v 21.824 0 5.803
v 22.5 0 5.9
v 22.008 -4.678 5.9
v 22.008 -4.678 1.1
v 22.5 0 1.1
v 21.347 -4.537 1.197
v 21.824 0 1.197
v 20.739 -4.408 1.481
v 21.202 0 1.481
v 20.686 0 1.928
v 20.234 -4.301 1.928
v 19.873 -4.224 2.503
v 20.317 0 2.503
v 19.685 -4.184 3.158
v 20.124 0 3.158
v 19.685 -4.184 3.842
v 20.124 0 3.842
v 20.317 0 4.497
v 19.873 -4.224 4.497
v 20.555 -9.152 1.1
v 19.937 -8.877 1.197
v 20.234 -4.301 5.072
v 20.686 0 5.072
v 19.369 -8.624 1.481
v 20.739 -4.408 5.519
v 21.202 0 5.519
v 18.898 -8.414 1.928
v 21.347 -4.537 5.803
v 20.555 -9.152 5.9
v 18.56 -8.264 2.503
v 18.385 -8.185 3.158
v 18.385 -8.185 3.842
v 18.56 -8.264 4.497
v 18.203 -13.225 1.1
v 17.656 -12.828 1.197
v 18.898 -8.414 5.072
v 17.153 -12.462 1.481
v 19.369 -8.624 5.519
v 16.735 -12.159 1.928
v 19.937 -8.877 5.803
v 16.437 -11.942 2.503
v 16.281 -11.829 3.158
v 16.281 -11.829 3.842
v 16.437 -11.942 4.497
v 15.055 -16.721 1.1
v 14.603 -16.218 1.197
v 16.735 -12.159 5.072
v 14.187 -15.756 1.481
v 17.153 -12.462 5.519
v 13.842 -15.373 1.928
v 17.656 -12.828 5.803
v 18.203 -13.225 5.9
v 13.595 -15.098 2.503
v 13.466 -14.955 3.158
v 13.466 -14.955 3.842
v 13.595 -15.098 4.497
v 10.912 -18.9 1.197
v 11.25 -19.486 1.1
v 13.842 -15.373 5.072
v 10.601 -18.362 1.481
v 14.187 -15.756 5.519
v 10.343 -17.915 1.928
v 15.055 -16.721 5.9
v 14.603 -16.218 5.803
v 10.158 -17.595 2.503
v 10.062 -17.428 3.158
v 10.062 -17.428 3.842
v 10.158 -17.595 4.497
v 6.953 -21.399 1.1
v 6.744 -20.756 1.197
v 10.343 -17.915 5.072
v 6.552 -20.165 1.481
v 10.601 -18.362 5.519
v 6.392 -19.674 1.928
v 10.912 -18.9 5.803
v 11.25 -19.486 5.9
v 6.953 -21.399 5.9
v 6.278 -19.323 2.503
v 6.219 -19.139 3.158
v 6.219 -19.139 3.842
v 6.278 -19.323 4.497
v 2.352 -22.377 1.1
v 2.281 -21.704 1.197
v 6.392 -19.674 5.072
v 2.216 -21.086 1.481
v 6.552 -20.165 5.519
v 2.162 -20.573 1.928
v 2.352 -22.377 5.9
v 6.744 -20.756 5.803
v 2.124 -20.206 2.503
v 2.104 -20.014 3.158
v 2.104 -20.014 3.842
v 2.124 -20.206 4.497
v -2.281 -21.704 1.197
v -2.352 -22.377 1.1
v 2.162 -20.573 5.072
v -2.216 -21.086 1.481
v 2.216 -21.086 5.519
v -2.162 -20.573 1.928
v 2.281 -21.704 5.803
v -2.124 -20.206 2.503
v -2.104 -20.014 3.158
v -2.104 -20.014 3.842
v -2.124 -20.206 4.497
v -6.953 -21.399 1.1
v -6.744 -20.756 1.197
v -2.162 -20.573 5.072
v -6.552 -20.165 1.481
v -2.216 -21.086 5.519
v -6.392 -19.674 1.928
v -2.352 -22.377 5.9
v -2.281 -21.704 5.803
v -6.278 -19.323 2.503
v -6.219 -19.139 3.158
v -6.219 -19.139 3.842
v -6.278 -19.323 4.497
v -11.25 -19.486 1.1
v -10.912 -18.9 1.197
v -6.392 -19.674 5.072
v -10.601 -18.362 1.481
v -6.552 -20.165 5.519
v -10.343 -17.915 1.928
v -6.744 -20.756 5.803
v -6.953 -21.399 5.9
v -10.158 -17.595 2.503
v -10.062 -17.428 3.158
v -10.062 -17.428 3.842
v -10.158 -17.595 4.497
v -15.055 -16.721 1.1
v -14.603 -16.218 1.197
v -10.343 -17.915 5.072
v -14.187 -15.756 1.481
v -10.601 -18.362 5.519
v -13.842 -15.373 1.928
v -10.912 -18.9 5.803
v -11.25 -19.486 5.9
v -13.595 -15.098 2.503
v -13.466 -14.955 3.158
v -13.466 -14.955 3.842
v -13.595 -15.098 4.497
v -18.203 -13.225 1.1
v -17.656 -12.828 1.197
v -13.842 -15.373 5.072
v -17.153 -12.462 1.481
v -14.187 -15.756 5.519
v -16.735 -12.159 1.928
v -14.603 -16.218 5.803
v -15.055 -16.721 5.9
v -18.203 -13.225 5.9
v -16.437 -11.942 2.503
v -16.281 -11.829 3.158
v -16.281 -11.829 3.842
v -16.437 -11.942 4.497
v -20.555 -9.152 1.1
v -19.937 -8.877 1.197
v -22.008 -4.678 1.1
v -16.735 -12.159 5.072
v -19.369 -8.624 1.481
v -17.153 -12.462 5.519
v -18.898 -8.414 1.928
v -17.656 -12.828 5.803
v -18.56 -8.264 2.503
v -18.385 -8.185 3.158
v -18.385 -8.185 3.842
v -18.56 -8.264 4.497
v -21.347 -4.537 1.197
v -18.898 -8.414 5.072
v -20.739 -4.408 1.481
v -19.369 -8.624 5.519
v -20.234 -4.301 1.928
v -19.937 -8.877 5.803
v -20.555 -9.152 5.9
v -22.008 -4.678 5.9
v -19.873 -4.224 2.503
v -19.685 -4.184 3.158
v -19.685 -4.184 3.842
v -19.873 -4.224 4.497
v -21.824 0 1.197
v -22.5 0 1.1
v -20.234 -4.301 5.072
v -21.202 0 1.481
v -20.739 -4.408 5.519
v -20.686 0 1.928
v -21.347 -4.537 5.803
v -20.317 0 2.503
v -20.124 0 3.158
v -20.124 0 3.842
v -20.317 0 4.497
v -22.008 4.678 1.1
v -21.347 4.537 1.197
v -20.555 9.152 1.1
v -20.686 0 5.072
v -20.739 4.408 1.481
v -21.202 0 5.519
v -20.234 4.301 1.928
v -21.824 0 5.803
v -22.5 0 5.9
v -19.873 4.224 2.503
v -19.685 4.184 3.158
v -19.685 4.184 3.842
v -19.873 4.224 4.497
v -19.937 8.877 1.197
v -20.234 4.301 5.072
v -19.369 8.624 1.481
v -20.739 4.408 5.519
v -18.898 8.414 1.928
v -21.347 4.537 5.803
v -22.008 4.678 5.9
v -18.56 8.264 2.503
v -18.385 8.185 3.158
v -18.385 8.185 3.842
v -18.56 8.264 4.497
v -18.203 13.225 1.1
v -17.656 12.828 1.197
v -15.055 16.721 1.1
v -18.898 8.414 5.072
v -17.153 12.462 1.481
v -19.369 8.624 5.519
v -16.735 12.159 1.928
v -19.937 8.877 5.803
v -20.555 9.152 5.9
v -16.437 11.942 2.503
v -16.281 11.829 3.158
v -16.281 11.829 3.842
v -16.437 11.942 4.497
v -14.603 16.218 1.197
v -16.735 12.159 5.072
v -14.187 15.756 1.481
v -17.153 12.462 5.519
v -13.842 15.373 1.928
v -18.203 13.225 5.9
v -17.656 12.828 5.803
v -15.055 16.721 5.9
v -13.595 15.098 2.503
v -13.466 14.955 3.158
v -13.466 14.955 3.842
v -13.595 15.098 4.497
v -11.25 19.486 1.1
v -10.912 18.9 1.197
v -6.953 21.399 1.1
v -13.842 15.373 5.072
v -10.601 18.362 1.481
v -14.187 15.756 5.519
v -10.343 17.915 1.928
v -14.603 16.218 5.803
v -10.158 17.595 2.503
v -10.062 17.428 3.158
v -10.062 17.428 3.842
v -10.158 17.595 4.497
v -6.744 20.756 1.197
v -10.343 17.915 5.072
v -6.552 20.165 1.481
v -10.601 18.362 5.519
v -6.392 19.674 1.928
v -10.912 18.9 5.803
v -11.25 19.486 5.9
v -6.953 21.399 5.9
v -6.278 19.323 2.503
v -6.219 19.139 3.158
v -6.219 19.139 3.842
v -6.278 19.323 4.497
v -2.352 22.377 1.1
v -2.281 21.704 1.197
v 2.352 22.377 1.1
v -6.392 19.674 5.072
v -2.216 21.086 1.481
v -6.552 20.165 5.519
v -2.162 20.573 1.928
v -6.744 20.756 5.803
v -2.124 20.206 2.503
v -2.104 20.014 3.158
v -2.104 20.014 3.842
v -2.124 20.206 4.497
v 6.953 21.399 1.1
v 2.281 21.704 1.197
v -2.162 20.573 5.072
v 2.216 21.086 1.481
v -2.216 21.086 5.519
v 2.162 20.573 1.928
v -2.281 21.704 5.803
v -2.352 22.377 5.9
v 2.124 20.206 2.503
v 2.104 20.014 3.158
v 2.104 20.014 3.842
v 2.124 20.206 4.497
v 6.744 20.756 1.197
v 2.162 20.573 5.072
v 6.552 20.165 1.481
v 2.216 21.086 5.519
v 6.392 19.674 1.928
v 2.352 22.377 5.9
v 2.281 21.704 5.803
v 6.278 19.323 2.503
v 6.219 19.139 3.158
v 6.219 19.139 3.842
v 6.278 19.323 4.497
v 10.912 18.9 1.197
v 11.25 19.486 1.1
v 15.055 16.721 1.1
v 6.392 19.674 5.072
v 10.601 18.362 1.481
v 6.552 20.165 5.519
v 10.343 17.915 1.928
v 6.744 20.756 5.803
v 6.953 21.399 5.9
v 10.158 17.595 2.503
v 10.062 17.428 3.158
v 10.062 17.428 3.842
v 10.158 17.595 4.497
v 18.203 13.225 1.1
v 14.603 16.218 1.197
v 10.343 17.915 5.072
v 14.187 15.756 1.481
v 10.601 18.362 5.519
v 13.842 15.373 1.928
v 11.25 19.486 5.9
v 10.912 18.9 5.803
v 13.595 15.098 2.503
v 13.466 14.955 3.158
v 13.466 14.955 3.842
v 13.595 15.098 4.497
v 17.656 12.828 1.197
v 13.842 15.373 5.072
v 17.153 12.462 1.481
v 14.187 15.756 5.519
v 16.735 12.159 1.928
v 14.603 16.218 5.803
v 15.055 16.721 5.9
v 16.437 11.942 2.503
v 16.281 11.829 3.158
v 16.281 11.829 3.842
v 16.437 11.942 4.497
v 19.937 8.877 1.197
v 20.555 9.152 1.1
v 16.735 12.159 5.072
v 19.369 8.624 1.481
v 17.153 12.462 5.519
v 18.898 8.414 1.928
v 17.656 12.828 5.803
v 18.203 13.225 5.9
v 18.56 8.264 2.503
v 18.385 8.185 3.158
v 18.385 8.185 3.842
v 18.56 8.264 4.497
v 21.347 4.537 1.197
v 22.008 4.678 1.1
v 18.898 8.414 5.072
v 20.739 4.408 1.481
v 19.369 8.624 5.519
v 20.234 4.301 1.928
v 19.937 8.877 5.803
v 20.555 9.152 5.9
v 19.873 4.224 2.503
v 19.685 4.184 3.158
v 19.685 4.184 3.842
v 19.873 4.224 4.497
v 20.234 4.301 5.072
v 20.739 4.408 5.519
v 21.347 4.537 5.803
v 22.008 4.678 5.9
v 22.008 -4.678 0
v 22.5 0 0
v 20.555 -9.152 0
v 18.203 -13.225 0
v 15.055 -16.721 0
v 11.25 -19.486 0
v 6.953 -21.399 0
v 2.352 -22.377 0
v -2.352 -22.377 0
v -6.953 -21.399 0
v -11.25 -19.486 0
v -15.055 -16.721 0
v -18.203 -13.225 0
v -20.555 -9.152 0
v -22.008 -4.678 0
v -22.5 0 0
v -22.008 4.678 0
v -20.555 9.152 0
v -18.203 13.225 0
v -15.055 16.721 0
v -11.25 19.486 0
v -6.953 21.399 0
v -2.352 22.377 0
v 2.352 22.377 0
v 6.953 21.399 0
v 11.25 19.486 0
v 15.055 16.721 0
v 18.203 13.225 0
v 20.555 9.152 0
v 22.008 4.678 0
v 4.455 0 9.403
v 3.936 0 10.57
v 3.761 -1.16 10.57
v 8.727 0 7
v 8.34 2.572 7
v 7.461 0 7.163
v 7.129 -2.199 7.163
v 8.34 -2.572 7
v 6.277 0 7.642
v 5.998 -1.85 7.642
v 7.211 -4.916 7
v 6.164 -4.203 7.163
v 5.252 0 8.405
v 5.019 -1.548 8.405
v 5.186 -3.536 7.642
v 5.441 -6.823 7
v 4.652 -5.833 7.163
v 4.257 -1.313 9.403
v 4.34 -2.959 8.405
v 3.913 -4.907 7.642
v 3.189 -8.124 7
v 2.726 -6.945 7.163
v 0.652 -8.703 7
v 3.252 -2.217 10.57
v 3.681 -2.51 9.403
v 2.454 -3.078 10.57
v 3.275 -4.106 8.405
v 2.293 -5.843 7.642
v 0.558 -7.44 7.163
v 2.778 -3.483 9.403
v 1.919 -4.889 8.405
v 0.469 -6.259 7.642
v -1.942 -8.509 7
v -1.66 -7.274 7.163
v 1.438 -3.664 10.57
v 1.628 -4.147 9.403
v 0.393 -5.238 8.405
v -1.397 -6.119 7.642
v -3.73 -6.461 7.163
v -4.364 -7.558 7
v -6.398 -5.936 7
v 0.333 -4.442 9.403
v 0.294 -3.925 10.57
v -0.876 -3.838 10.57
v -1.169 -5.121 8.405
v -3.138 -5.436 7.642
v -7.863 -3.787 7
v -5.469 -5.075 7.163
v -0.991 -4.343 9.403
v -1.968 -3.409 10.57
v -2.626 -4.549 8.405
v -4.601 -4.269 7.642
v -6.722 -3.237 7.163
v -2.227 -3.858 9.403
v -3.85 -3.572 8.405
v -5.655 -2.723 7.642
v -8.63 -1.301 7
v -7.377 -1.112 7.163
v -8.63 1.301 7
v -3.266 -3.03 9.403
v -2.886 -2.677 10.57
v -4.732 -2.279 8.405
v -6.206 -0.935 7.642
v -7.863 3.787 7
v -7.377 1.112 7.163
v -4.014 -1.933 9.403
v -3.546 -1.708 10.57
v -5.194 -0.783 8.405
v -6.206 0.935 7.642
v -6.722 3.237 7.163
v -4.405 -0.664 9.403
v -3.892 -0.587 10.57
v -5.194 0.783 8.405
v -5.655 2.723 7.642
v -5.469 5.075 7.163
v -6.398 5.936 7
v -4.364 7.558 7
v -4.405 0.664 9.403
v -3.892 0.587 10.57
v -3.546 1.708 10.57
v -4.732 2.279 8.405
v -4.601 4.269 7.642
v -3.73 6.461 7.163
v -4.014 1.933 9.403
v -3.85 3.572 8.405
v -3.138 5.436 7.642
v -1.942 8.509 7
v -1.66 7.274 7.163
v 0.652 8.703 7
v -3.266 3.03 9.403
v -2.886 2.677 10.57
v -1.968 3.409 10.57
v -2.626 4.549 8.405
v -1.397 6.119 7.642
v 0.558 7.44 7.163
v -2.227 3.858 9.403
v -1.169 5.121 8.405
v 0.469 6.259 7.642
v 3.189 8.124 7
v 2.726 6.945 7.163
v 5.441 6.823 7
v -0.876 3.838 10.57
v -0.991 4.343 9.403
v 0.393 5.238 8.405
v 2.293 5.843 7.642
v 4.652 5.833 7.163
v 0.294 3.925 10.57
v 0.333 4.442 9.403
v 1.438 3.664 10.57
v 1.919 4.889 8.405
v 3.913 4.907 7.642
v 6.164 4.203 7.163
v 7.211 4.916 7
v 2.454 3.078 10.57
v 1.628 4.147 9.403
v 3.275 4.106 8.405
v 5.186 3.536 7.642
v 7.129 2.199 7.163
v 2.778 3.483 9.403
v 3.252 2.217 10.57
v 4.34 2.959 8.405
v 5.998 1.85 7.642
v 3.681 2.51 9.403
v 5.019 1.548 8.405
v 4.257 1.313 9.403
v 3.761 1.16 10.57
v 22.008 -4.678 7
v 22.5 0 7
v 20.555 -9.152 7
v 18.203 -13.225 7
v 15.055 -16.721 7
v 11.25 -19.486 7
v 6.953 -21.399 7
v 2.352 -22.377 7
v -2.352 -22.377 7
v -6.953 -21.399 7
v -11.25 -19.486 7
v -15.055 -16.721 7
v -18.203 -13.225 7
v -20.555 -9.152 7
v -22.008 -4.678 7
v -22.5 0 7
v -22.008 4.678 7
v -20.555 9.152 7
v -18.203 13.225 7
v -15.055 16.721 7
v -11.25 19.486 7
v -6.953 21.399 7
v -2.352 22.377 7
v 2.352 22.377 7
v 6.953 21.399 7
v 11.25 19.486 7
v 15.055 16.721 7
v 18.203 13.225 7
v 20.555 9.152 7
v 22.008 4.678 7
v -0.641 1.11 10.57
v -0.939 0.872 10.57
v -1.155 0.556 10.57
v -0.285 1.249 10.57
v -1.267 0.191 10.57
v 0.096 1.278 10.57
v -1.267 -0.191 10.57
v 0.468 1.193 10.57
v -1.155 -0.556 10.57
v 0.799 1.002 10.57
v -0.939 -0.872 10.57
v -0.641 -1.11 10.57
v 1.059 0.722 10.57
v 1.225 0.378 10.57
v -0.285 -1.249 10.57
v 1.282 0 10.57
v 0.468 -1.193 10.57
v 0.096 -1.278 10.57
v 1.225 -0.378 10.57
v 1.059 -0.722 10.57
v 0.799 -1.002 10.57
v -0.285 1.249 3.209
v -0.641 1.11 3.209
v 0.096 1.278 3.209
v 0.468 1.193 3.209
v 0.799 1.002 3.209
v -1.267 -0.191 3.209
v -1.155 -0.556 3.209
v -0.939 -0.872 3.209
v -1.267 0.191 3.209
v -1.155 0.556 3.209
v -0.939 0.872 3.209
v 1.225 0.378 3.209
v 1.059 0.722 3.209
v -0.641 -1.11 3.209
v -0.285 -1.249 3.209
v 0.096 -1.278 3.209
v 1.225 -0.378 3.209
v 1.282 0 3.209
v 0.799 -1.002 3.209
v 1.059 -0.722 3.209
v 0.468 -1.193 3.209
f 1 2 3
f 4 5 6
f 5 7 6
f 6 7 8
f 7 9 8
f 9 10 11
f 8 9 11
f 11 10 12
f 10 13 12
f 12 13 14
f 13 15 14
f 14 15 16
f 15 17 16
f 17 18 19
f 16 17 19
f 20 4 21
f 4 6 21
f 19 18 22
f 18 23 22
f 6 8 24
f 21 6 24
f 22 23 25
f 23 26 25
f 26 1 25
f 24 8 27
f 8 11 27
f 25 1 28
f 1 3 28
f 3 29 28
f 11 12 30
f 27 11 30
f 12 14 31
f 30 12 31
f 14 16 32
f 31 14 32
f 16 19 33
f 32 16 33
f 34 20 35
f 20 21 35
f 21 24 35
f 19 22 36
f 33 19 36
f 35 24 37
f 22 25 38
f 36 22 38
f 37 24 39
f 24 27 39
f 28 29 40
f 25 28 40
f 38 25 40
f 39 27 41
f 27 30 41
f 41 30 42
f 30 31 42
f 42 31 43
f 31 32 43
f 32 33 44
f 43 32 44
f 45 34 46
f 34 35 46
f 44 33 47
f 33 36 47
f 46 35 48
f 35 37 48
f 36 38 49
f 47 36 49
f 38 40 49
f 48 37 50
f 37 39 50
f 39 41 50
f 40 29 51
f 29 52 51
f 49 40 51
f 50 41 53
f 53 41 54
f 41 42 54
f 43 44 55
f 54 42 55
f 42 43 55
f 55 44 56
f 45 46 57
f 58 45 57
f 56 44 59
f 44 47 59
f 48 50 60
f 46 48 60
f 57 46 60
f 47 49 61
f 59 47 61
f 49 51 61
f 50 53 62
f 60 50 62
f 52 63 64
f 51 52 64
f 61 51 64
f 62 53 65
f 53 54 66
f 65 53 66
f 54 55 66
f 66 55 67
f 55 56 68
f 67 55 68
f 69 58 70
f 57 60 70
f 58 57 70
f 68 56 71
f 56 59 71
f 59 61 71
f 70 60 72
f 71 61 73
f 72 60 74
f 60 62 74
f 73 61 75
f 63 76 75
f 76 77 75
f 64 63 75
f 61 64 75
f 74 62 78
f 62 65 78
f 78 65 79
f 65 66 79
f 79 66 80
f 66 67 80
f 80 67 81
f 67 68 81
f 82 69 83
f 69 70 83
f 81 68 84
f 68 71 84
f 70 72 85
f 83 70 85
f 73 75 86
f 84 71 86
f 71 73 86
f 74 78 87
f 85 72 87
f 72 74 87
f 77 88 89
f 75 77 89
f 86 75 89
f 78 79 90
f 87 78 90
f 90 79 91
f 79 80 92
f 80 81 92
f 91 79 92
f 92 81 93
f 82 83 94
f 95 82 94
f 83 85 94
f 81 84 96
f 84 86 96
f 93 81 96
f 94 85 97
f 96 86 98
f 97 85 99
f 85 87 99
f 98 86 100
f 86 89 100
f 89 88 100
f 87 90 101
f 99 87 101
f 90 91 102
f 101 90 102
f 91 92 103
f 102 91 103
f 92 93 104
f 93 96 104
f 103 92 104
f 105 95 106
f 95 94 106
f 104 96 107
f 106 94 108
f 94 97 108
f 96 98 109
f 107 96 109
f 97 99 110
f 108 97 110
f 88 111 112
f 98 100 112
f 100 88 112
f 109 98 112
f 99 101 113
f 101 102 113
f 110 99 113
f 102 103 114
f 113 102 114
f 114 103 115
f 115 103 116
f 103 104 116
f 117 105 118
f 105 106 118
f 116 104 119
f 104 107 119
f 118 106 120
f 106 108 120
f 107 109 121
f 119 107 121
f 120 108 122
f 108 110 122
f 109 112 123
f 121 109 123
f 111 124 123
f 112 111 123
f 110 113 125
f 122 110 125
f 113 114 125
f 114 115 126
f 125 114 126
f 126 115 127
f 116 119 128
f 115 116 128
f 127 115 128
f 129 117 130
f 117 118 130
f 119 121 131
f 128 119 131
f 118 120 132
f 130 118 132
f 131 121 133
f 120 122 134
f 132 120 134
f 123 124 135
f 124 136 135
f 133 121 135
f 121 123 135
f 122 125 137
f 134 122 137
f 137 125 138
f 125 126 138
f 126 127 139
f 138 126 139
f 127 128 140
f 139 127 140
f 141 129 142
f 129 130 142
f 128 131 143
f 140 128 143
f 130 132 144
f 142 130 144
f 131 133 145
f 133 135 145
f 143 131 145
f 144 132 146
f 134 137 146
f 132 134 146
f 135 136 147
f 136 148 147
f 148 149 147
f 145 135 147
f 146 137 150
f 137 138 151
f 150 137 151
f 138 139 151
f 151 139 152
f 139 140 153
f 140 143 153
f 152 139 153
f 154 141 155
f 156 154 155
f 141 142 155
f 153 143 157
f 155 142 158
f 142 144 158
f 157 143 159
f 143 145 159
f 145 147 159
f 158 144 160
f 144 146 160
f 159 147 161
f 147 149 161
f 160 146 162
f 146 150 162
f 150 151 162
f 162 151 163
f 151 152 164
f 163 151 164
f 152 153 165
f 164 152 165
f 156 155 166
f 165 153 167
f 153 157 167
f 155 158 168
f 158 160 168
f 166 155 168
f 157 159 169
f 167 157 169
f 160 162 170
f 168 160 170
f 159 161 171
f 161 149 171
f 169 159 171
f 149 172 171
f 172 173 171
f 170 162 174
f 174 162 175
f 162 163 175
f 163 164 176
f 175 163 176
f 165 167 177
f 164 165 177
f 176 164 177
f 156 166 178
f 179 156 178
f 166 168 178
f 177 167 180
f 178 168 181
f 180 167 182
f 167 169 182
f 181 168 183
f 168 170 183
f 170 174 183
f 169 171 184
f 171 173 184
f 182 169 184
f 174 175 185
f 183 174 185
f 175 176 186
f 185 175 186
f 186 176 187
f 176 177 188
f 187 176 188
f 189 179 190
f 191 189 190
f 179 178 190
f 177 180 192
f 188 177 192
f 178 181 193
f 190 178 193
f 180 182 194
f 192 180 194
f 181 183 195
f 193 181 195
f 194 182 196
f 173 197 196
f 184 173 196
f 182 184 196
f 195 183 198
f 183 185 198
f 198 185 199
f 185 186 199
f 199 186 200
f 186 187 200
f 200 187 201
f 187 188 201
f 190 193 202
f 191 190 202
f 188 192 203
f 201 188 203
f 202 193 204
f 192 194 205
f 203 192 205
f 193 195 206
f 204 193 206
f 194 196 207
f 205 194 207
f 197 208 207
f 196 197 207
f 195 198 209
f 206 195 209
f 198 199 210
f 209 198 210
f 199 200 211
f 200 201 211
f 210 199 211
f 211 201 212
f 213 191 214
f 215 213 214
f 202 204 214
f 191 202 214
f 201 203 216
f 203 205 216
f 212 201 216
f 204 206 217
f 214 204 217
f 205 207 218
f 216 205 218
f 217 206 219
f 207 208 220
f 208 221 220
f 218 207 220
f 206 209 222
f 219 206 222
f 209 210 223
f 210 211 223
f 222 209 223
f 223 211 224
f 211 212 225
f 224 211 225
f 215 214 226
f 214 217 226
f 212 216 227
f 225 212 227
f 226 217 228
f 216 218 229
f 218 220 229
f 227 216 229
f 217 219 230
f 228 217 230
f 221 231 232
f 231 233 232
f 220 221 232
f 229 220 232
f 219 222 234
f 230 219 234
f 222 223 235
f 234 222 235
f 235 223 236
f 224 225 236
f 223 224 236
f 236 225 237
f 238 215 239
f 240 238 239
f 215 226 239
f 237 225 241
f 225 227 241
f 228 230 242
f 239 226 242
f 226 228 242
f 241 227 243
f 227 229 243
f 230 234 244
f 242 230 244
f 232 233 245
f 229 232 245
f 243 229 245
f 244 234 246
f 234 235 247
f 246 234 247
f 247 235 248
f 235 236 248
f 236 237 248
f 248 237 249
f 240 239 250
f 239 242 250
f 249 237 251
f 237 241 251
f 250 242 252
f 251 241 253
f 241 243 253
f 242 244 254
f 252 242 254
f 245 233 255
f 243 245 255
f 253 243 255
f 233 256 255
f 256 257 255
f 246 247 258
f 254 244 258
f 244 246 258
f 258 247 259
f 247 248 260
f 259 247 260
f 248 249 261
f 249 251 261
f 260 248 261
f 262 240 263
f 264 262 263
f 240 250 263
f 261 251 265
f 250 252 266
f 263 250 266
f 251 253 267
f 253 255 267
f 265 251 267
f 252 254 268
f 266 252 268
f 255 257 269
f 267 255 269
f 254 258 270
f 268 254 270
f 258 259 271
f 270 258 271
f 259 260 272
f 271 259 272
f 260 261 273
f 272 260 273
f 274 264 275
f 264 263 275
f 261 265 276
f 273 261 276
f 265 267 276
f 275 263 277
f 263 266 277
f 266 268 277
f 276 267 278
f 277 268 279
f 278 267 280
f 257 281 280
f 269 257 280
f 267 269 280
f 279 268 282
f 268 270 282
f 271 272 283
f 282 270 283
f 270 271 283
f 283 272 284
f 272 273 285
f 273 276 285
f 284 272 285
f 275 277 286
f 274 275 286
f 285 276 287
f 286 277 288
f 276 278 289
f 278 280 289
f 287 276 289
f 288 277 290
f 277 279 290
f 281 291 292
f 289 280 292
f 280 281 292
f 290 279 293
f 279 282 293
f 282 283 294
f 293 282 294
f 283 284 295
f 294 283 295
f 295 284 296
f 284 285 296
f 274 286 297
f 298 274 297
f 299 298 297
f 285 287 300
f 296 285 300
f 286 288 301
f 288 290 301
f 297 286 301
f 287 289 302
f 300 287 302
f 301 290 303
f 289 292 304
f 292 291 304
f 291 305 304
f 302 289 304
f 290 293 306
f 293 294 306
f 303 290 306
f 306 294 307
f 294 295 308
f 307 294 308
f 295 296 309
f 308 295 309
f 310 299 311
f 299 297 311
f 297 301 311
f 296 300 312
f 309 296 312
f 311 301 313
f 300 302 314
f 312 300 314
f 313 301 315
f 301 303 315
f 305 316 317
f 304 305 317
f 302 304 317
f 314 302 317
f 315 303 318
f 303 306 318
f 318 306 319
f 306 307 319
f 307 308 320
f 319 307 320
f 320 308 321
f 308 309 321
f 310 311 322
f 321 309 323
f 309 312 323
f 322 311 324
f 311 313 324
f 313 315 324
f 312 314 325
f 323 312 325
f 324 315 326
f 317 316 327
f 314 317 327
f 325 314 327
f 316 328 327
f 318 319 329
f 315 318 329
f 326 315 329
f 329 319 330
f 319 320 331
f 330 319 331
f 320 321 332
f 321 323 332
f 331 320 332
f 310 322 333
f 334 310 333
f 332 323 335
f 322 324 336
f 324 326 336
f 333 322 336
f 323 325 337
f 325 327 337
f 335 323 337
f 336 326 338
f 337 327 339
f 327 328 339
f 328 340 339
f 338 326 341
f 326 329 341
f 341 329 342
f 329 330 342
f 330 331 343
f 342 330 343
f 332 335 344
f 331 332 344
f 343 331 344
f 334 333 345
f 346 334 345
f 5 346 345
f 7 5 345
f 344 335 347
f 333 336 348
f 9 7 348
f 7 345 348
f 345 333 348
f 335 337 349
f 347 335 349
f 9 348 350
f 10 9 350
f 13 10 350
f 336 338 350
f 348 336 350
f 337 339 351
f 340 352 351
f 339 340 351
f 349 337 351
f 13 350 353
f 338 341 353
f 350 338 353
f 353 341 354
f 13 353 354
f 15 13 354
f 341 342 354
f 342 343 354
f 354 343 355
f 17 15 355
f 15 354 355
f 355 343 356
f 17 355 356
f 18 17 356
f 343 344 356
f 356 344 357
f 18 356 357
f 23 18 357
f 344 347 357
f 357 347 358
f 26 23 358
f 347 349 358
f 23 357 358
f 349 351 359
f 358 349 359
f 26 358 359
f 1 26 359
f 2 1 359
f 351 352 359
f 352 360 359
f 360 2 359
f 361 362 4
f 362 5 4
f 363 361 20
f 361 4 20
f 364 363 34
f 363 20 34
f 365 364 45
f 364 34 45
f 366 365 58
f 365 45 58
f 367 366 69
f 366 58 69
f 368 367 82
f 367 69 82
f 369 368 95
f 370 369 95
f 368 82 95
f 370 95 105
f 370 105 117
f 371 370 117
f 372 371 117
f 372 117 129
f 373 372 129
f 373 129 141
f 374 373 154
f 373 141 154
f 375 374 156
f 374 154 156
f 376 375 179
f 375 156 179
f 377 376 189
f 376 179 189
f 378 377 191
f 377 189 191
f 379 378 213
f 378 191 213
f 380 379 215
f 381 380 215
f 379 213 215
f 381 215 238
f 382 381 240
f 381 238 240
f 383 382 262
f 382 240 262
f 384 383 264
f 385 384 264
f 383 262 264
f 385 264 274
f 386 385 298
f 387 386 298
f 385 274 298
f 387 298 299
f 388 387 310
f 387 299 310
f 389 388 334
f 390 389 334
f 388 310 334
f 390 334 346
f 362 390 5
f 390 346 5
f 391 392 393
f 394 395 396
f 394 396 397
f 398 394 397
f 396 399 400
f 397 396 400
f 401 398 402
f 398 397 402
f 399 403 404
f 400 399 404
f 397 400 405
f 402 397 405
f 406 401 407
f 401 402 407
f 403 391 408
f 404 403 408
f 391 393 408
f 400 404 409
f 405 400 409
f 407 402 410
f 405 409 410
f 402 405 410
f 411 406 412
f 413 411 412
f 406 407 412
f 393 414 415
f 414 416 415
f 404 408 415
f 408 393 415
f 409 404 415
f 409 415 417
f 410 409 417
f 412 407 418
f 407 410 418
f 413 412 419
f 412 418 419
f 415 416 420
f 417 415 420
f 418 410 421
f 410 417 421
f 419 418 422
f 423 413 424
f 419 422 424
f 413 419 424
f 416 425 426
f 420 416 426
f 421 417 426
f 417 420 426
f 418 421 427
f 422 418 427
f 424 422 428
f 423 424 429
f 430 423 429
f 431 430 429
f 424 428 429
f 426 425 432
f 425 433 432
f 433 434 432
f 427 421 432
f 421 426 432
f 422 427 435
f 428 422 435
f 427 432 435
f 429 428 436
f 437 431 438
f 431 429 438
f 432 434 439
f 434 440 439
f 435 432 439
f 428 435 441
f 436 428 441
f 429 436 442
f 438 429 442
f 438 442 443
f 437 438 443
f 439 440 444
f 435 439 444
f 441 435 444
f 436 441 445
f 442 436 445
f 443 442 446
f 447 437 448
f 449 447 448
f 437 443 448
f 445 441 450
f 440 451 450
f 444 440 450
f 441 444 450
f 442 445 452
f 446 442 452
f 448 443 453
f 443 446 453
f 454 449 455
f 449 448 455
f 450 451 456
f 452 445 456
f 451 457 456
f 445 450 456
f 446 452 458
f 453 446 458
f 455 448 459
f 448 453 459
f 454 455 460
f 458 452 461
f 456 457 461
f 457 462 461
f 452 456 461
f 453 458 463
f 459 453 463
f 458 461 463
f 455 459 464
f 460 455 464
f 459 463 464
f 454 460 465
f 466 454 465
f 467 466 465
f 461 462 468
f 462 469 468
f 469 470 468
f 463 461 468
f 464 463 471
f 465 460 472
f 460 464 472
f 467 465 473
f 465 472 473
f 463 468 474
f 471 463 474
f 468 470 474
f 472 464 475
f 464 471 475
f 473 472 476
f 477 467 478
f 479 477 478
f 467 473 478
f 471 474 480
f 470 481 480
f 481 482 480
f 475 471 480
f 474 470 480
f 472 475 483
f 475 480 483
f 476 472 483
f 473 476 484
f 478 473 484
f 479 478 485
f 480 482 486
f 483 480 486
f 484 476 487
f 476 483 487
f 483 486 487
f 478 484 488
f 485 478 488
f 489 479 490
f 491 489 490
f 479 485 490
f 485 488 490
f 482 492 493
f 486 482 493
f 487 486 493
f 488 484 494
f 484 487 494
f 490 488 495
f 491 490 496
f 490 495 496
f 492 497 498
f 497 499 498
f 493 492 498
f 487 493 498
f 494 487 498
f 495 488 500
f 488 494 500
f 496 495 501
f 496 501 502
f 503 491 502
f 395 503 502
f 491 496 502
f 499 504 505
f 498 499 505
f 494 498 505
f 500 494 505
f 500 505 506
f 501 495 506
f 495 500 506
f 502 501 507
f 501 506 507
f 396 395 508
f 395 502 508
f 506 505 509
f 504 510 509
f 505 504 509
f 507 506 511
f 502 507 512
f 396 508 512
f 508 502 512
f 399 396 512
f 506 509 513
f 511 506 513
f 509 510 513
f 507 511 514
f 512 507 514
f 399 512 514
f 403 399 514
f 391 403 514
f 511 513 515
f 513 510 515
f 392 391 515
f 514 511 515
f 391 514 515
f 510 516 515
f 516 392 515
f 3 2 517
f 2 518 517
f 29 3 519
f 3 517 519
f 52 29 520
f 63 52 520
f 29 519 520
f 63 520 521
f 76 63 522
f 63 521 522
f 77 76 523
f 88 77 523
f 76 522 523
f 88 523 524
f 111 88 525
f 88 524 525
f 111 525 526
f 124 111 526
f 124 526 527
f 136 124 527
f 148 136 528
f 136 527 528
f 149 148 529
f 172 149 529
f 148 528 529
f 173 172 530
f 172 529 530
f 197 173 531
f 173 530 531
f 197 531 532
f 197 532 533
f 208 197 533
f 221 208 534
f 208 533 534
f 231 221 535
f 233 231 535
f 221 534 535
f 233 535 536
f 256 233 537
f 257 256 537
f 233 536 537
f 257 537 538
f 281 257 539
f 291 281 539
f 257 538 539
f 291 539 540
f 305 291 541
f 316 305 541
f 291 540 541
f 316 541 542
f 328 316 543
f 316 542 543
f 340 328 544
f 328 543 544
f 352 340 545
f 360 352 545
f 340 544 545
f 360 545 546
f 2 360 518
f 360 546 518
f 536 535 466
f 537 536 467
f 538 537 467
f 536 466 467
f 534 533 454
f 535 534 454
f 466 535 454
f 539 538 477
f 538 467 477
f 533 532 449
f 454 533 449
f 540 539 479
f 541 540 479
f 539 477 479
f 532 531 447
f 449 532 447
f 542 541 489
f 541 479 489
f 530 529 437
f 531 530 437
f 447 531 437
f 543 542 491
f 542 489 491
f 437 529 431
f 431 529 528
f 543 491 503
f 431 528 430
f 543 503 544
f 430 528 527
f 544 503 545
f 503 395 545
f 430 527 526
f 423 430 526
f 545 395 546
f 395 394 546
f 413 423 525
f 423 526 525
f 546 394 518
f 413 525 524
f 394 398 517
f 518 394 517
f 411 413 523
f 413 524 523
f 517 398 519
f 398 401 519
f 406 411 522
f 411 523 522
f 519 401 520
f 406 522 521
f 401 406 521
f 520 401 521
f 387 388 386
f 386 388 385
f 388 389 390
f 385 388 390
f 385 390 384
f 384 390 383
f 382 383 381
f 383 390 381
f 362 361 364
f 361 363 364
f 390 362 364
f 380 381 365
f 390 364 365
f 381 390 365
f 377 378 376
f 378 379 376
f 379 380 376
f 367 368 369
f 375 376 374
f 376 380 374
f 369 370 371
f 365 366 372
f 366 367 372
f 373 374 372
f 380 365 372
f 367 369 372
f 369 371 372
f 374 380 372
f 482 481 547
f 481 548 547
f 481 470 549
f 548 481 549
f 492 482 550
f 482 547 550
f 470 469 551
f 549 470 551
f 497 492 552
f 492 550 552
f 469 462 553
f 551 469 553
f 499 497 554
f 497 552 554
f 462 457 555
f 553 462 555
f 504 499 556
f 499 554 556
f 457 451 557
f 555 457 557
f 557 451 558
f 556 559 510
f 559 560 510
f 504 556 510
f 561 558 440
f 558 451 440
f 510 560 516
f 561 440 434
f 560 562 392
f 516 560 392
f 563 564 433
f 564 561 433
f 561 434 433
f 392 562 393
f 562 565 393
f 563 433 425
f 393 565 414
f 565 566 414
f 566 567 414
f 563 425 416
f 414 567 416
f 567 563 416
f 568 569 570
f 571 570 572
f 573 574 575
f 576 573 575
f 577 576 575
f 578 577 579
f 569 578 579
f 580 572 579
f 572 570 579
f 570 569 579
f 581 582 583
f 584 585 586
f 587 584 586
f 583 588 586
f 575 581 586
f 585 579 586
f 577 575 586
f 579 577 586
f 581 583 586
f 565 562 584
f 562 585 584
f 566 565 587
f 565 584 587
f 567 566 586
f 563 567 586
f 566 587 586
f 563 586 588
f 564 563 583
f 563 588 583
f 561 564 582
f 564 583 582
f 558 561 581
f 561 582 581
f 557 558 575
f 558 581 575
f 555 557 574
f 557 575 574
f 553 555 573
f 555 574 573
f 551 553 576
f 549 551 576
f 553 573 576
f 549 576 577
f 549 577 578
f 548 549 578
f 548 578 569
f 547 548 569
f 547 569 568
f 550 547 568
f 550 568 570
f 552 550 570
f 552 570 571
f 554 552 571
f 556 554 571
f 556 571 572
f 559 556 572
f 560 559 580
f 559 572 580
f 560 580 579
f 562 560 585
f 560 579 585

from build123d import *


# Not quite as in the source:
# - a fillet or chamfer that OpenCascade refuses, or shapes differently, is made with other operations: its cross-section is extruded or revolved along the edge and cut away or added


with BuildPart() as f1:
    # F0 (on Front) → F1 (revolve)
    with BuildSketch(Plane.XZ):
        with BuildLine():
            Line((0, 3.2086027786), (0, 0))
            Line((0, 0), (22.5, 0))
            Line((22.5, 0), (22.5, 1.1))
            ThreePointArc((22.5, 1.1), (20.1, 3.5), (22.5, 5.9))
            Line((22.5, 5.9), (22.5, 7))
            Line((22.5, 7), (3.9362940006, 7))
            Line((3.9362940006, 7), (3.9362940006, 10.5700949207))
            Line((3.9362940006, 10.5700949207), (1.281605335, 10.5700949207))
            Line((1.281605335, 10.5700949207), (1.281605335, 3.2086027786))
            Line((1.281605335, 3.2086027786), (0, 3.2086027786))
        make_face()
    revolve(axis=Axis((0, 0, 5.2850474603), (0, 0, -1)))

    # F2: fillet of radius 5 on 1 edges, made by hand

    # F2_s1 → F2_t2 (revolve)
    with BuildSketch(Plane.XZ):
        with BuildLine():
            ThreePointArc((8.7274704182, 7), (5.739956853, 7.9906655542), (3.9362940006, 10.5700949207))
            Line((3.9362940006, 10.5700949207), (3.9362940006, 7))
            Line((3.9362940006, 7), (8.7274704182, 7))
        make_face()
    revolve(axis=Axis((0, 0, 7), (0, 0, -1)))


solid = f1.part
